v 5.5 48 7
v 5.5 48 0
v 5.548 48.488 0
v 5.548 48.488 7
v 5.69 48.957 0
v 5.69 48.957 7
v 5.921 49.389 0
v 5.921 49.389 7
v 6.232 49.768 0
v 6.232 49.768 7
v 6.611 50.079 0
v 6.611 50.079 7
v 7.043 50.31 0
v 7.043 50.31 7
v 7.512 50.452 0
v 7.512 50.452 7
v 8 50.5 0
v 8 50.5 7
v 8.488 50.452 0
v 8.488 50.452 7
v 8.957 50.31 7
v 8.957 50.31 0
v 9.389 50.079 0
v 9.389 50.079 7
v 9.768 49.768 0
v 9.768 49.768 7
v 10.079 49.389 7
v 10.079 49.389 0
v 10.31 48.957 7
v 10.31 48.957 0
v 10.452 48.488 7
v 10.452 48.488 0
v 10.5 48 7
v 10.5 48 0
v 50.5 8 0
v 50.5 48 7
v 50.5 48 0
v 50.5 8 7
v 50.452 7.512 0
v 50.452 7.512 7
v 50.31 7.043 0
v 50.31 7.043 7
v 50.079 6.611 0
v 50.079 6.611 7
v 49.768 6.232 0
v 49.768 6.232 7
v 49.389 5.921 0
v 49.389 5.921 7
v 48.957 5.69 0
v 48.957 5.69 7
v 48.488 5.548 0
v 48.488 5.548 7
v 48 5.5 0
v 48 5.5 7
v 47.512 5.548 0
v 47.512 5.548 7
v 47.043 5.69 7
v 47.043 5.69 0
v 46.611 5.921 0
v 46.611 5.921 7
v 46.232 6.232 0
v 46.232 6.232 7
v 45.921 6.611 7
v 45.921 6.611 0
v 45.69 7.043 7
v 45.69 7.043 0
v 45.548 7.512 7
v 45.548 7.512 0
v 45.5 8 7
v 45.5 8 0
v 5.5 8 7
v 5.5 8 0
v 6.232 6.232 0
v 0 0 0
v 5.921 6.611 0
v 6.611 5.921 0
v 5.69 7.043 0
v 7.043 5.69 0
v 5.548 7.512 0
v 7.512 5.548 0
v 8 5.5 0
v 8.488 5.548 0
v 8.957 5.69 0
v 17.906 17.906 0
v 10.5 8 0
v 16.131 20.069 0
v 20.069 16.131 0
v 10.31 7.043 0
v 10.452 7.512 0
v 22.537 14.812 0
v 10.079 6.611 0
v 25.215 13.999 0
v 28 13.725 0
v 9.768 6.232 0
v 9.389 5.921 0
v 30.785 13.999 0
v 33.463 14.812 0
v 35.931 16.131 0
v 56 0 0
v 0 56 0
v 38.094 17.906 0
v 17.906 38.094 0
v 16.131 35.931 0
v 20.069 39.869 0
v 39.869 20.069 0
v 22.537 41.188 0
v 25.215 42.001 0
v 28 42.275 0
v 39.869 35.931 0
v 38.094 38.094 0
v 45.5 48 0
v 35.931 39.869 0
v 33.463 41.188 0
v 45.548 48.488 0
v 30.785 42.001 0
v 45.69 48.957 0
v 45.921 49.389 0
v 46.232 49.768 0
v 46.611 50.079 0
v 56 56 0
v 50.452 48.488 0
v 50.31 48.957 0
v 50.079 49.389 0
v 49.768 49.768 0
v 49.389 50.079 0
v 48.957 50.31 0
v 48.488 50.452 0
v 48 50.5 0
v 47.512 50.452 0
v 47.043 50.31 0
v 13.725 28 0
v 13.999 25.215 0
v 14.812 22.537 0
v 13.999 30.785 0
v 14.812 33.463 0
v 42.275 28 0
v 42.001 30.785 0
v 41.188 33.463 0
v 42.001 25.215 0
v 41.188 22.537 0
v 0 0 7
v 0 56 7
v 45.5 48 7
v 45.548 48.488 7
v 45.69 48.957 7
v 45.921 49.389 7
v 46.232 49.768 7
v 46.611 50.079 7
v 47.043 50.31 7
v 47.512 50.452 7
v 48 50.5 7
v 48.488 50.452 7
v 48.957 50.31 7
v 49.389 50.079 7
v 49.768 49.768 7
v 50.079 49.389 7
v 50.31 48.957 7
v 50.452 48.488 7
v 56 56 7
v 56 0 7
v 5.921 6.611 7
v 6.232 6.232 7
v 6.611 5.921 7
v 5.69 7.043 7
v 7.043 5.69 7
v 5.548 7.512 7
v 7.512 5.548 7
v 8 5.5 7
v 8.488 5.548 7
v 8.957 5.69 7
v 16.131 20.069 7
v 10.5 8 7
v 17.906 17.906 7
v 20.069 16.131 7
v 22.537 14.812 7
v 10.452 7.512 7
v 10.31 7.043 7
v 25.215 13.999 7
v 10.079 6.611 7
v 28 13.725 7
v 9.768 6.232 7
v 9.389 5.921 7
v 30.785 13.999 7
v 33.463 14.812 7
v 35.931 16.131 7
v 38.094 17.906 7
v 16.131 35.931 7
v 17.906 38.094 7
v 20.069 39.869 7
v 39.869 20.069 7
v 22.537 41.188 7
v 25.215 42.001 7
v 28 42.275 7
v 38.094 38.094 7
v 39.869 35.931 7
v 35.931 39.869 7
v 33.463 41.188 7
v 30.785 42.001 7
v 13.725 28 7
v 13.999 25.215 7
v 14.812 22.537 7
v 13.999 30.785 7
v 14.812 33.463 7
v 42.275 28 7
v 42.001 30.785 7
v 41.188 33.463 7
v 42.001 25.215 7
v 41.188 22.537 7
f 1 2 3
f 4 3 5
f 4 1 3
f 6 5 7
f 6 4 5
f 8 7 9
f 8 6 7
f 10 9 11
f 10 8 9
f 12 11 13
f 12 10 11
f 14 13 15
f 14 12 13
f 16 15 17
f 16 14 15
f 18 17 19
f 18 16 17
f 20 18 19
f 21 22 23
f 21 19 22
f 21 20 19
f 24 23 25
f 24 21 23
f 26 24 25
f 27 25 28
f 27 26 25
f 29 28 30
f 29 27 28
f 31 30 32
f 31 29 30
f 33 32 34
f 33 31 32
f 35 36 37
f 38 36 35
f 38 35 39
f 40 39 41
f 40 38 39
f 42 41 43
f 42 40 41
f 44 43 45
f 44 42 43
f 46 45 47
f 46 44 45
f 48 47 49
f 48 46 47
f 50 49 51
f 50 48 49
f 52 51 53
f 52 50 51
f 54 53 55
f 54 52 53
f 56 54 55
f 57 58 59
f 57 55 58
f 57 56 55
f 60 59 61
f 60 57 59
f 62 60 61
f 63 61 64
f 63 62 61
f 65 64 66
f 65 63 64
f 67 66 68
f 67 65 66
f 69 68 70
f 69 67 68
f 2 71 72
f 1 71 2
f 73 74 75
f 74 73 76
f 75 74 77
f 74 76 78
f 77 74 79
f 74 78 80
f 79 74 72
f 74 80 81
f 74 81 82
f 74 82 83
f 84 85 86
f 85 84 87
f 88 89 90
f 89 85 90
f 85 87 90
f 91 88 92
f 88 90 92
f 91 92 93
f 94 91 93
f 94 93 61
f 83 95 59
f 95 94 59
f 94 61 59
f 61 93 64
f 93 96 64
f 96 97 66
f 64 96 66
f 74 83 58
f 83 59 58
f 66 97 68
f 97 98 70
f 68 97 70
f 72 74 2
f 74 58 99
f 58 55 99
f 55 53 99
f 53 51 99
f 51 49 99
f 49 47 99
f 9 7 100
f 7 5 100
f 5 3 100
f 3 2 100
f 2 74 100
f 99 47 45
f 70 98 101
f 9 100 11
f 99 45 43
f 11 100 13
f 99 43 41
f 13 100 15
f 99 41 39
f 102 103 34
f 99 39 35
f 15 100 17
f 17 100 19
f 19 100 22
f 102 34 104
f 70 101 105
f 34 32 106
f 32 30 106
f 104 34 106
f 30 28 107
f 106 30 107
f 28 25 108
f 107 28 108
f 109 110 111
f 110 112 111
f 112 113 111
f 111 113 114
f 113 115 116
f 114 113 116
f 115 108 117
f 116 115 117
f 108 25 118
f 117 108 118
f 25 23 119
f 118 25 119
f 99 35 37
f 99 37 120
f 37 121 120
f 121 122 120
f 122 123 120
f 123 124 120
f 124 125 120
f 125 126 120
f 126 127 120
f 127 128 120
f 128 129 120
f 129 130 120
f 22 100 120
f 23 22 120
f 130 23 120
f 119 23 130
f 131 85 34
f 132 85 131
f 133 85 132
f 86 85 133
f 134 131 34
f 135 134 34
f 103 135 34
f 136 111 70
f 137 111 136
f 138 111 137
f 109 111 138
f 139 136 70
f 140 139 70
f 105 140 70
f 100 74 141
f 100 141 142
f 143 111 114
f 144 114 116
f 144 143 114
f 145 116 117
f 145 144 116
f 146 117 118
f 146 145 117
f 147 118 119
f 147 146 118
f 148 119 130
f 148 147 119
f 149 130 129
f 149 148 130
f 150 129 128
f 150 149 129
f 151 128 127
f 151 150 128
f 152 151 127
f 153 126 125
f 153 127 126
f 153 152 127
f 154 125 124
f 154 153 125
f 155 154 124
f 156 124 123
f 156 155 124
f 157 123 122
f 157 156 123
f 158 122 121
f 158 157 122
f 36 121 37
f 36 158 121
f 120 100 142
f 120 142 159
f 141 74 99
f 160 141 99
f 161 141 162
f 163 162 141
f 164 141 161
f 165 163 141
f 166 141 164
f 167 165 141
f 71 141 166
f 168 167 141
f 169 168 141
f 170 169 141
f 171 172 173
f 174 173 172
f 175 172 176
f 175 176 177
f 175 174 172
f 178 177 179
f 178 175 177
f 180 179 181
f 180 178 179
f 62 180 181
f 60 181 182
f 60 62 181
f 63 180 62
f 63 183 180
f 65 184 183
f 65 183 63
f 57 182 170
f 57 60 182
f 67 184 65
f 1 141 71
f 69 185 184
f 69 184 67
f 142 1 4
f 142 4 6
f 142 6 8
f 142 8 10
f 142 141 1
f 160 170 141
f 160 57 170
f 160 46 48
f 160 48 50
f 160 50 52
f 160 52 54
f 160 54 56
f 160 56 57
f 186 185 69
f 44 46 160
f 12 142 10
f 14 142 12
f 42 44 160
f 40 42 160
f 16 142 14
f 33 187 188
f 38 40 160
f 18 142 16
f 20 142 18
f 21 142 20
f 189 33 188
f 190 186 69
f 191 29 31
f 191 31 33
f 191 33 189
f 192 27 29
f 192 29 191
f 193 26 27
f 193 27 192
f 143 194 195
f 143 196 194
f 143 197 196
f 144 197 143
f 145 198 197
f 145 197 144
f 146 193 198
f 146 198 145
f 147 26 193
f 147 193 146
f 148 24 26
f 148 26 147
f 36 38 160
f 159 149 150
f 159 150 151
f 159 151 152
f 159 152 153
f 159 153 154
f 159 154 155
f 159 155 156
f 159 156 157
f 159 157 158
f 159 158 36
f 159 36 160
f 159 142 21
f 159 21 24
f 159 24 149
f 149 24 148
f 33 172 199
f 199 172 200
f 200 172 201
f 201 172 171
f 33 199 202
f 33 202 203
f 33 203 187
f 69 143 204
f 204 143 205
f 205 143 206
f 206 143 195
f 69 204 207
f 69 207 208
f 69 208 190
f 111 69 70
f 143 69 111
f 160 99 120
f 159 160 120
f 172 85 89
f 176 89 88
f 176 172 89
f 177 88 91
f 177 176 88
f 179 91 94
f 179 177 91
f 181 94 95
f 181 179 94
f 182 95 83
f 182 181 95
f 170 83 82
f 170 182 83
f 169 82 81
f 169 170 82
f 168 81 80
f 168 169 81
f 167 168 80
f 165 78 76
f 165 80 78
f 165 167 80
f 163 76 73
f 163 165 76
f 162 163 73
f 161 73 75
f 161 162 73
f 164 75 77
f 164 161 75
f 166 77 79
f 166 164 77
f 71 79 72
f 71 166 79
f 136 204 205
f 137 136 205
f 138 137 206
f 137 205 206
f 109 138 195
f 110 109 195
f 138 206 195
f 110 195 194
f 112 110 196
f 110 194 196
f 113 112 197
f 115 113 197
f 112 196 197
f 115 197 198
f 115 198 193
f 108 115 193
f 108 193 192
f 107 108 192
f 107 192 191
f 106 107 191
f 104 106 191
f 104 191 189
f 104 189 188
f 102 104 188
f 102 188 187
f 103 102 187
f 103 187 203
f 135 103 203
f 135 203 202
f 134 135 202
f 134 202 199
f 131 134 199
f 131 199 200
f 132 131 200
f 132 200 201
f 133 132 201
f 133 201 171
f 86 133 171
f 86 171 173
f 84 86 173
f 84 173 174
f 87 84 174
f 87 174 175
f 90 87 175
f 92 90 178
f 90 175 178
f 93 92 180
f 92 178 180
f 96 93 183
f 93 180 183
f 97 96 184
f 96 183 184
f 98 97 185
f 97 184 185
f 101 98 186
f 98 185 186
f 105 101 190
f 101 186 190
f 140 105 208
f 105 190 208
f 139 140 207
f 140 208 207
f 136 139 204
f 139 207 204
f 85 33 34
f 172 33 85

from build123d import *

# Parameters (mm, degrees)
SKETCH1_W           = 56
SKETCH1_H           = 56
BOSS_EXTRUDE1_DEPTH = 7
SKETCH2_R           = 14.275
CUT_EXTRUDE1_DEPTH  = 8


with BuildPart() as part:
    # Sketch1 → Boss-Extrude1 (new body)
    with BuildSketch(Plane.XY):
        with Locations((28, 28)):
            Rectangle(SKETCH1_W, SKETCH1_H)
    extrude(amount=BOSS_EXTRUDE1_DEPTH)

    # Sketch2 → Cut-Extrude1 (cut, through all)
    with BuildSketch(Plane.XY.offset(7)):
        with Locations((28, 28)):
            Circle(SKETCH2_R)
        with BuildLine():
            Line((10.5, 48), (10.5, 8))
            ThreePointArc((10.5, 8), (8, 5.5), (5.5, 8))
            Line((5.5, 8), (5.5, 48))
            ThreePointArc((5.5, 48), (8, 50.5), (10.5, 48))
        make_face()
        with BuildLine():
            Line((50.5, 48), (50.5, 8))
            ThreePointArc((50.5, 8), (48, 5.5), (45.5, 8))
            Line((45.5, 8), (45.5, 48))
            ThreePointArc((45.5, 48), (48, 50.5), (50.5, 48))
        make_face()
    extrude(amount=-CUT_EXTRUDE1_DEPTH, mode=Mode.SUBTRACT)


solid = part.part
